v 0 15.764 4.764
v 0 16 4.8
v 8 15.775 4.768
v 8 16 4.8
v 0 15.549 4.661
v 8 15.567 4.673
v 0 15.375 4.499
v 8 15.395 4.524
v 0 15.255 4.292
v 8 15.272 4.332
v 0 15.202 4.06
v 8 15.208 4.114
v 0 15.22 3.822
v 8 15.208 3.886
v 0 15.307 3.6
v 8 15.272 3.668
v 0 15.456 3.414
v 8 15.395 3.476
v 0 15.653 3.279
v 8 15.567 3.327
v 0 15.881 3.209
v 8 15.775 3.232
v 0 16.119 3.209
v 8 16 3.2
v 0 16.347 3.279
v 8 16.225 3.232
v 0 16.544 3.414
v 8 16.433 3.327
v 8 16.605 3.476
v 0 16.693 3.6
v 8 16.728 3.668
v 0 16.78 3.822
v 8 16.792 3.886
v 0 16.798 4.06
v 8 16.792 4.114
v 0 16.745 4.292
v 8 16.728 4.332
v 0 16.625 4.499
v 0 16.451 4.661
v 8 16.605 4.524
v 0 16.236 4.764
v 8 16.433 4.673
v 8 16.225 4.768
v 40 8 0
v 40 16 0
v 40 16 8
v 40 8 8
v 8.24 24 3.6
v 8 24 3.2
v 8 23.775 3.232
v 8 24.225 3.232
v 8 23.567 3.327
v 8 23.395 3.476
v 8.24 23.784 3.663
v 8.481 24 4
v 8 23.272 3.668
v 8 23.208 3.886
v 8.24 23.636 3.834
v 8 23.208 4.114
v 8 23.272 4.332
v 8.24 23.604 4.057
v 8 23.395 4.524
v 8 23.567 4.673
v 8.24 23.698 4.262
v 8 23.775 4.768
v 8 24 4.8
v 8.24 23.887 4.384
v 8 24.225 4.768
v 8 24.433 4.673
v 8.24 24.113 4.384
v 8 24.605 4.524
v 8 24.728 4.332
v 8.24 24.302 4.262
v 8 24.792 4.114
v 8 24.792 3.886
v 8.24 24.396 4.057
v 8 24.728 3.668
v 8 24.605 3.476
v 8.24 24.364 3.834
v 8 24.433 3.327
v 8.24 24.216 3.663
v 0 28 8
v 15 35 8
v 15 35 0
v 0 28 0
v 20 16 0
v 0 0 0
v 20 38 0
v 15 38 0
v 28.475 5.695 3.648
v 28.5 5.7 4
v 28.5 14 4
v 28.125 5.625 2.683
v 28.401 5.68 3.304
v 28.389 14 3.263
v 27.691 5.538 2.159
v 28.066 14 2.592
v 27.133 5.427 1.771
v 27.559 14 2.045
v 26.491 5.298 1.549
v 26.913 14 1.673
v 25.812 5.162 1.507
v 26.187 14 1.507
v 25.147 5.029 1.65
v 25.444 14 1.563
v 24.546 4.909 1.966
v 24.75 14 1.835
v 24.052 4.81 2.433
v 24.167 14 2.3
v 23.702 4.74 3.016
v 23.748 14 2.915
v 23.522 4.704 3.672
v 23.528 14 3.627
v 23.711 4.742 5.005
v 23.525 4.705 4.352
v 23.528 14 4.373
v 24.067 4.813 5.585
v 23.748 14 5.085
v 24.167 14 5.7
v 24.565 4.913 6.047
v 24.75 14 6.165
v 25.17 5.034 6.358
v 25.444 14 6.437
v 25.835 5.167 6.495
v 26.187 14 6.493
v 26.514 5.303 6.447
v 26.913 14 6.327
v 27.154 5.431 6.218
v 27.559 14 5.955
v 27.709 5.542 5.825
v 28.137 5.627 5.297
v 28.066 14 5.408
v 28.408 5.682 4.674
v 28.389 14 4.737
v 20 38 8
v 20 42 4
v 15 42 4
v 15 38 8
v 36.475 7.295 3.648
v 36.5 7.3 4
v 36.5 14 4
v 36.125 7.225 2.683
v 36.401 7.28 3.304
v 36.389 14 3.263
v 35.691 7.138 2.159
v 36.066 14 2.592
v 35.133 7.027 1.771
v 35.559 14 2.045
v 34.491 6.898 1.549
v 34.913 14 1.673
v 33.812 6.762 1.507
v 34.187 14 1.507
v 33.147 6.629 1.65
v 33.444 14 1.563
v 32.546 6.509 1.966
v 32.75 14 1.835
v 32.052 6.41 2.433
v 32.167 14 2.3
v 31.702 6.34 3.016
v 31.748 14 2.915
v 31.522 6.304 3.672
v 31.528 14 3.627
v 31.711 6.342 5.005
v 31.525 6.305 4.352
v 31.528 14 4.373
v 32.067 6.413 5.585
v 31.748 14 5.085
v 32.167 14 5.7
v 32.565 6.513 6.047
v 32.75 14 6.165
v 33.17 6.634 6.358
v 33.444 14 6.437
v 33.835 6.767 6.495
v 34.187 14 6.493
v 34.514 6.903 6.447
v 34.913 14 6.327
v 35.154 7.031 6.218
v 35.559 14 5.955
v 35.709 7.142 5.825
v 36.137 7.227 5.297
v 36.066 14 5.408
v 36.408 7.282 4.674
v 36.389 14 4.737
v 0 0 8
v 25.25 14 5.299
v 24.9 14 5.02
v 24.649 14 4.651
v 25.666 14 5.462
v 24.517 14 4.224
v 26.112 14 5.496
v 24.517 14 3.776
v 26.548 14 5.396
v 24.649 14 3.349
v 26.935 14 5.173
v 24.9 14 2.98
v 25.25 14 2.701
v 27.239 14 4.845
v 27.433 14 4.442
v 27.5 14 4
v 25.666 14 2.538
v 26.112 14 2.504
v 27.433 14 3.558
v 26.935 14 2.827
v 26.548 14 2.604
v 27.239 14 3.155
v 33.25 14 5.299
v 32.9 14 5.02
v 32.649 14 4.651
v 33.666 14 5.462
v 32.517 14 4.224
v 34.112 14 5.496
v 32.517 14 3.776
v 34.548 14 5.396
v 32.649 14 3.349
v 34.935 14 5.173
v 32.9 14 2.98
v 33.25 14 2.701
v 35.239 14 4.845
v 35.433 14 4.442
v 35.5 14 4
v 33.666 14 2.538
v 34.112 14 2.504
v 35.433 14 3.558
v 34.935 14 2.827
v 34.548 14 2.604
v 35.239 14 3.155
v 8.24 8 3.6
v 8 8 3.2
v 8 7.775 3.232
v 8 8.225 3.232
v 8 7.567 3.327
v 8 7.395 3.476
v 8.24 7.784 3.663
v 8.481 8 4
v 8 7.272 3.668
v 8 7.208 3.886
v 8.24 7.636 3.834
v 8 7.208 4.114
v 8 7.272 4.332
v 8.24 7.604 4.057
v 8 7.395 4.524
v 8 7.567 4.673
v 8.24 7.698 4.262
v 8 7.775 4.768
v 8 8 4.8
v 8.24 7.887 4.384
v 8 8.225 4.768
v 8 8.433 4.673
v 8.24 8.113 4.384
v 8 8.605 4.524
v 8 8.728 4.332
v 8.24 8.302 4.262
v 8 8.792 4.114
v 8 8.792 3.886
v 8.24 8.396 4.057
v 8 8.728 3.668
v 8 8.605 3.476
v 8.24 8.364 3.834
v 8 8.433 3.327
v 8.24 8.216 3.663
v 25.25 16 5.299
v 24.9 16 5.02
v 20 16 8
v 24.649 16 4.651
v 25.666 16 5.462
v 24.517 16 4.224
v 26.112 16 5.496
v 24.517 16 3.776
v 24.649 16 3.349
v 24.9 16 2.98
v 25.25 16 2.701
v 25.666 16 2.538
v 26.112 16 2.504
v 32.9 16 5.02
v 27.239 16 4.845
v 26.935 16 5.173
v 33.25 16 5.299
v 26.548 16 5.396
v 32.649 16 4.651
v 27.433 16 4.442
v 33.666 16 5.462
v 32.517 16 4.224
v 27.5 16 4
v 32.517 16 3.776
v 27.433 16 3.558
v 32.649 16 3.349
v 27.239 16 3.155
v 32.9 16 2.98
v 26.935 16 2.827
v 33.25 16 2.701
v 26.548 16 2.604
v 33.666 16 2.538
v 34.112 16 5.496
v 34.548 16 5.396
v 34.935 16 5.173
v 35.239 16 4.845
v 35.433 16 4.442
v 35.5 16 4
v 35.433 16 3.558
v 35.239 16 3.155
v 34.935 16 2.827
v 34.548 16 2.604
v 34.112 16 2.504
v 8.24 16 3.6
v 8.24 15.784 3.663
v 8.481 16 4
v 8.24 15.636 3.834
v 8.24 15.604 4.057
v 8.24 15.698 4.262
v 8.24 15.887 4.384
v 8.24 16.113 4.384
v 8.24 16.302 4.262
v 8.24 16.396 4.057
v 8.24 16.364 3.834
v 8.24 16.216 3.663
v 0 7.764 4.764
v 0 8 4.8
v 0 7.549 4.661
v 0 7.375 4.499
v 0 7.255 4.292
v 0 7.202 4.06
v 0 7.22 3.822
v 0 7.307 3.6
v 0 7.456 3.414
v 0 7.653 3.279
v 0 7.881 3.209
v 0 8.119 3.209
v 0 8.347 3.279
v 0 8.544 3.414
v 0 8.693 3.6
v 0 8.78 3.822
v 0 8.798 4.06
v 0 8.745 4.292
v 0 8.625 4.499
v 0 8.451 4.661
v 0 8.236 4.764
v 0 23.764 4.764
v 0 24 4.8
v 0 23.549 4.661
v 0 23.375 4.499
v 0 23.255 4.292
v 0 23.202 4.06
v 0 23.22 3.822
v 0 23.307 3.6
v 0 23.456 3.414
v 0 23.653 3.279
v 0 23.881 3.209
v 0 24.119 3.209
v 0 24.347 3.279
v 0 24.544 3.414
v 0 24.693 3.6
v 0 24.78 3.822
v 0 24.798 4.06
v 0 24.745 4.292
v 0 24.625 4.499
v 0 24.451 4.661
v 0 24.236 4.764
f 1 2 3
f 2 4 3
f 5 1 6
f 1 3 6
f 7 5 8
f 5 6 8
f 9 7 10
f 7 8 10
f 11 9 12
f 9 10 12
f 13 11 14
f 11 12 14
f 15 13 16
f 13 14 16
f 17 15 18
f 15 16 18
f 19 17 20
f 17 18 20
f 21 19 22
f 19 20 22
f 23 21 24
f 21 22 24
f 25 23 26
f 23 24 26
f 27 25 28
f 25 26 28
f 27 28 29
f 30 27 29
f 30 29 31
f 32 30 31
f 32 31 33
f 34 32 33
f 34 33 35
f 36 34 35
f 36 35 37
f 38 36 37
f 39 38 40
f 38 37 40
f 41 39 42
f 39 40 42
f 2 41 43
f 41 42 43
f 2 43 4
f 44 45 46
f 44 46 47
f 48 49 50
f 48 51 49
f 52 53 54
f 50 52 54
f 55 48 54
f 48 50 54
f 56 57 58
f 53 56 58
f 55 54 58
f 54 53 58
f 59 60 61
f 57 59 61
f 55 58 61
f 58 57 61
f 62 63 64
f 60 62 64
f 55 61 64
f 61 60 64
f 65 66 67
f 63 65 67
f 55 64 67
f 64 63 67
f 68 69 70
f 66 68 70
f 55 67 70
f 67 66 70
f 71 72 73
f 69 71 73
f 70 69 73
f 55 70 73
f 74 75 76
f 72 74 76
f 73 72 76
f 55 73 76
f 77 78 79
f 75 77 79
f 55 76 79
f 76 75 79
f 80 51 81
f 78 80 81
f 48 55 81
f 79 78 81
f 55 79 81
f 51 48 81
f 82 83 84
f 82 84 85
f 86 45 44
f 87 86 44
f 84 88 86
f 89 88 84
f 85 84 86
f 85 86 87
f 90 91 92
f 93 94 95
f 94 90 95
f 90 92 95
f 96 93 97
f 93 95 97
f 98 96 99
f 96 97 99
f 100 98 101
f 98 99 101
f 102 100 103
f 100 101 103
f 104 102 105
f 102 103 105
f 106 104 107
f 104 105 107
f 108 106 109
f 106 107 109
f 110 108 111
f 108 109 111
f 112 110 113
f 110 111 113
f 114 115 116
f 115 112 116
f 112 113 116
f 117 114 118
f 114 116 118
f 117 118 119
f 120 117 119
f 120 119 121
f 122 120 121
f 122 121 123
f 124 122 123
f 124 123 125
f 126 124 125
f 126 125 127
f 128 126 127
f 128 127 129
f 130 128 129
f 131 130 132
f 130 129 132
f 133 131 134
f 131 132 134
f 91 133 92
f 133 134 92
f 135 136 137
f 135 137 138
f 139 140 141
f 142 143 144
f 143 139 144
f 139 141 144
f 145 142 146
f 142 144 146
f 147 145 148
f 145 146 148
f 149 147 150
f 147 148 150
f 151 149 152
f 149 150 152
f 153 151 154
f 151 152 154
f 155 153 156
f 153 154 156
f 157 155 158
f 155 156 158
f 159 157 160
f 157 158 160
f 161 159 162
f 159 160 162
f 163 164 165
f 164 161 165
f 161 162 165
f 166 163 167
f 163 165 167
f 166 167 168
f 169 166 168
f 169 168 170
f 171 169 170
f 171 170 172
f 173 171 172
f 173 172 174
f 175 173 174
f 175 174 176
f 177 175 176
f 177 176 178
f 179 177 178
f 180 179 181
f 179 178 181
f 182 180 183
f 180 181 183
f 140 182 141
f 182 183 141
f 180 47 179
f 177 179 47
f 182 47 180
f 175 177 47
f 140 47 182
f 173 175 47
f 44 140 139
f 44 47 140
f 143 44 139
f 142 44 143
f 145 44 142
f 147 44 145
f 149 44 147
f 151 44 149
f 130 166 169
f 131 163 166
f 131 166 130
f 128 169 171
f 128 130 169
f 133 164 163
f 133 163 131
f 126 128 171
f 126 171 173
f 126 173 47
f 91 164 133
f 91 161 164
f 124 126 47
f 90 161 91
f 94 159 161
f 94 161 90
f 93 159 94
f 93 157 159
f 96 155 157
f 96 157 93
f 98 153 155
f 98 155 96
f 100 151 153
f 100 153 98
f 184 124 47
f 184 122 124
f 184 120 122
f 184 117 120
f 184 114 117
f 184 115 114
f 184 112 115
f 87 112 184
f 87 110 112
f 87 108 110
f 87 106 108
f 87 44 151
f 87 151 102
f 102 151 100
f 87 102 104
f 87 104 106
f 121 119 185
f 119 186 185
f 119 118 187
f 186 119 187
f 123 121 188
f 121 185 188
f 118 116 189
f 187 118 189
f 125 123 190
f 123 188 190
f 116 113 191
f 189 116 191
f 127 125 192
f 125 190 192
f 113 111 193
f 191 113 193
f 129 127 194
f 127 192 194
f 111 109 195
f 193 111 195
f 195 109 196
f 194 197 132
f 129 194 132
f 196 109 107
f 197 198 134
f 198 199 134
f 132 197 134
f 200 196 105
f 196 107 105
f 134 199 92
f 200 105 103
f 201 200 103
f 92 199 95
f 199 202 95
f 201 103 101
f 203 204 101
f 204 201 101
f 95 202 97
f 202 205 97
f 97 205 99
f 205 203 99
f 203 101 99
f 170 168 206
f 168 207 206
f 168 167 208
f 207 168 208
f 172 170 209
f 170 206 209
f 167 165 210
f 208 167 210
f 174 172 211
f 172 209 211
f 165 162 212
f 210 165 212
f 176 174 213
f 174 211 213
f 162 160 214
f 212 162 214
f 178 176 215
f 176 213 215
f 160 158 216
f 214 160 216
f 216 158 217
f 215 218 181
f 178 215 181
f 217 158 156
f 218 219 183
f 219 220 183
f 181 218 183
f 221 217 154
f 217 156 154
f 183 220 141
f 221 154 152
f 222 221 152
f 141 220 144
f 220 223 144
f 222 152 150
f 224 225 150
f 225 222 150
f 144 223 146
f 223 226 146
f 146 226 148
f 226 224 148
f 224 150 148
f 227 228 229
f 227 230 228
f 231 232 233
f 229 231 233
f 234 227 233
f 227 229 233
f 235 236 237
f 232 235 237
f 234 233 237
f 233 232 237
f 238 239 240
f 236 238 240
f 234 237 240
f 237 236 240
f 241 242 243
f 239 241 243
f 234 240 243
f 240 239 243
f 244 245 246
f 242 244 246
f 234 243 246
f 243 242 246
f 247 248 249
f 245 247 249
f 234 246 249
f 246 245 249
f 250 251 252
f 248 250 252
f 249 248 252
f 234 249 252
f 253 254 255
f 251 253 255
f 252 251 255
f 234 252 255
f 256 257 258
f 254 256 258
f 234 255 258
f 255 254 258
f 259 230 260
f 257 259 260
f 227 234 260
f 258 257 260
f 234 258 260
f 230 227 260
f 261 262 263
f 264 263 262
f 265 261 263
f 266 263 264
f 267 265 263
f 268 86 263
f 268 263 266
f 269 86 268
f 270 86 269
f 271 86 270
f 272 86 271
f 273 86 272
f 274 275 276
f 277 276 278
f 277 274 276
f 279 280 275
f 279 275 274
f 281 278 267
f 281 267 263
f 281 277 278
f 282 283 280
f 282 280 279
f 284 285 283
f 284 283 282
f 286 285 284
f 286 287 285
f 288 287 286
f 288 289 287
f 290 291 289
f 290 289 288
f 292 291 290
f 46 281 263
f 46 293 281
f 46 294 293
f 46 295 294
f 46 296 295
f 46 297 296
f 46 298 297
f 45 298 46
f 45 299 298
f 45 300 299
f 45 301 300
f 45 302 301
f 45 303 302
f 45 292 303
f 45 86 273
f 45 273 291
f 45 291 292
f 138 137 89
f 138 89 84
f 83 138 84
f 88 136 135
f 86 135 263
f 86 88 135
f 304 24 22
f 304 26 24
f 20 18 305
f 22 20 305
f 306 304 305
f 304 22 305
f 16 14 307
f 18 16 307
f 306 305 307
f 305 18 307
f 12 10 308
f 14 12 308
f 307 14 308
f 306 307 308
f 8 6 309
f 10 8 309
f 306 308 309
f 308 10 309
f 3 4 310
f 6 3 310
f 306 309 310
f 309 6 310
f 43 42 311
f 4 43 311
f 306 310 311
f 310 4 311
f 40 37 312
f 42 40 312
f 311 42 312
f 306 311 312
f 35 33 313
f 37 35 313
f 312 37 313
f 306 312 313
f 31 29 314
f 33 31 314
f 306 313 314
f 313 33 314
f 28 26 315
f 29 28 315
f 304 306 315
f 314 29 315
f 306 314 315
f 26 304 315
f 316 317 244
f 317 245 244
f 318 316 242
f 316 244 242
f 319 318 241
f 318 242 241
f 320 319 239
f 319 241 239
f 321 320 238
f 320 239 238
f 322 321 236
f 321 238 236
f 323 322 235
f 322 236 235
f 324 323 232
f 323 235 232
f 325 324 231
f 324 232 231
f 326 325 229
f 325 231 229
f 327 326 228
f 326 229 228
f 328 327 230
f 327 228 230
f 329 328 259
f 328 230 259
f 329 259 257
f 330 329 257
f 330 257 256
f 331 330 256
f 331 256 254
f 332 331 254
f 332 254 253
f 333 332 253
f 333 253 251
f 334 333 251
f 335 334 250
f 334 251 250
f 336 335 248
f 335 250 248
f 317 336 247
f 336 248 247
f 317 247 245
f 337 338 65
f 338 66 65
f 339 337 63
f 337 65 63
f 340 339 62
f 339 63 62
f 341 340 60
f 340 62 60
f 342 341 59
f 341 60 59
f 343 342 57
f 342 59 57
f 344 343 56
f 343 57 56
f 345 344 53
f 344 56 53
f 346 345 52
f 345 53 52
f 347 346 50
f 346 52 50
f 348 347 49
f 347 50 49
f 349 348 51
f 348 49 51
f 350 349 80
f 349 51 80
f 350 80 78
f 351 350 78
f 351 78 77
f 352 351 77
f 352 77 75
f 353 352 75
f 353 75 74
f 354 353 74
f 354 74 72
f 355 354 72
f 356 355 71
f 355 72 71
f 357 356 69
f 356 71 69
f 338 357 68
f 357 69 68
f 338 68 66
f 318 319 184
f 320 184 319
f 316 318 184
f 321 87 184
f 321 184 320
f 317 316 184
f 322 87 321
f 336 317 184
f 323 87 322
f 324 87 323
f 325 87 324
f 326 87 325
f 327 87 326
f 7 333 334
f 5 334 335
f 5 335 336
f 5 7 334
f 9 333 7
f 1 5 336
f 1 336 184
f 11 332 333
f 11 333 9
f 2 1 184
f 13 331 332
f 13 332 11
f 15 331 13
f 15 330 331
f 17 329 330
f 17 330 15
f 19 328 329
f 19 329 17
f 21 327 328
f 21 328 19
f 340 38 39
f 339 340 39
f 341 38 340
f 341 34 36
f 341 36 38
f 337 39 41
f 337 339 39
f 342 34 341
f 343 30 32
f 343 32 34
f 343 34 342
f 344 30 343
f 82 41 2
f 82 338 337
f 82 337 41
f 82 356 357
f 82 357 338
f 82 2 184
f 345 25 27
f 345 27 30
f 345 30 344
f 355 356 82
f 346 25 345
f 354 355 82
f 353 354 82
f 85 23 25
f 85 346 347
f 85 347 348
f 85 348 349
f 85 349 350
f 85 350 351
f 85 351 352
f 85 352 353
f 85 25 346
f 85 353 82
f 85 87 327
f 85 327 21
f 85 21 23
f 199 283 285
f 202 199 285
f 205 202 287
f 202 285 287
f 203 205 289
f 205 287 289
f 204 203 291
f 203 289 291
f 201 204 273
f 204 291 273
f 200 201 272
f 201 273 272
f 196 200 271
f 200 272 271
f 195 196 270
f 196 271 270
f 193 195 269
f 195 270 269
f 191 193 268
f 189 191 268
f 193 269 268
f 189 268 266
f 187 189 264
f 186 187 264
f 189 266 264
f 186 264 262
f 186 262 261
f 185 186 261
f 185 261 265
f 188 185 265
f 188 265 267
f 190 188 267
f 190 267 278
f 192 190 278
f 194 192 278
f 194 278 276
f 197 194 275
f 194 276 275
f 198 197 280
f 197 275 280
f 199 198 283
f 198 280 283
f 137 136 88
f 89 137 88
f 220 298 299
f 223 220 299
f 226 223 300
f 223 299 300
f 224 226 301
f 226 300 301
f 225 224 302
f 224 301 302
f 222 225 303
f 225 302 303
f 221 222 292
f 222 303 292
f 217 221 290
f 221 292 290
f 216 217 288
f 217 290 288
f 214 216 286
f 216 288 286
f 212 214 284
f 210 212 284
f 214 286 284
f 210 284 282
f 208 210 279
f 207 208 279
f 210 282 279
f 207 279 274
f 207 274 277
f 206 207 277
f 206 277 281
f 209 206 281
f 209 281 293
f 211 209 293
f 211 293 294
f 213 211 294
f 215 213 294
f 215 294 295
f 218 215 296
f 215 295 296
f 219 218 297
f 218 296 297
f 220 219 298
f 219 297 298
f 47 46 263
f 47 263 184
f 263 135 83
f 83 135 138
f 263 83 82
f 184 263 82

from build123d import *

# Parameters (mm, degrees)
BOSS_EXTRUDE1_DEPTH       = 8
CUT_EXTRUDE1_DEPTH        = 8
SKETCH7_R                 = 1.5
CUT_EXTRUDE4_DEPTH        = 2
SKETCH9_R                 = 2.5
CUT_EXTRUDE5_DEPTH        = 15
CUT_EXTRUDE2_DEPTH        = 21
CUT_EXTRUDE3_DEPTH        = 21
M2X0_4_TAPPED_HOLE1_D     = 1.6
M2X0_4_TAPPED_HOLE1_DEPTH = 8
M2X0_4_TAPPED_HOLE1_TIP   = 0.480688495


with BuildPart() as part:
    # Sketch1 → Boss-Extrude1 (new body)
    with BuildSketch(Plane.XY):
        Polygon((0, 0), (0, 42), (20, 42), (20, 16), (40, 16), (40, 8), align=None)
    extrude(amount=BOSS_EXTRUDE1_DEPTH)

    # Sketch2 → Cut-Extrude1 (cut)
    with BuildSketch(Plane.XY.offset(8)):
        Polygon((15, 42), (15, 35), (0, 28), (0, 42), align=None)
    extrude(amount=-CUT_EXTRUDE1_DEPTH, mode=Mode.SUBTRACT)

    # Sketch7 → Cut-Extrude4 (cut)
    with BuildSketch(Plane(origin=(0, 16, 0), x_dir=(1, 0, 0), z_dir=(0, 1, 0))):
        with Locations((34, -4)):
            Circle(SKETCH7_R)
        with Locations((26, -4)):
            Circle(SKETCH7_R)
    extrude(amount=-CUT_EXTRUDE4_DEPTH, mode=Mode.SUBTRACT)

    # Sketch9 → Cut-Extrude5 (cut, through all)
    with BuildSketch(Plane(origin=(0, 14, 0), x_dir=(1, 0, 0), z_dir=(0, 1, 0))):
        with Locations((34, -4)):
            Circle(SKETCH9_R)
        with Locations((26, -4)):
            Circle(SKETCH9_R)
    extrude(amount=-CUT_EXTRUDE5_DEPTH, mode=Mode.SUBTRACT)

    # Sketch5 → Cut-Extrude2 (cut, through all)
    with BuildSketch(Plane(origin=(20, 0, 0), x_dir=(0, 0, -1), z_dir=(1, 0, 0))):
        Polygon((-8, 42), (-4, 42), (-8, 38), align=None)
    extrude(amount=-CUT_EXTRUDE2_DEPTH, mode=Mode.SUBTRACT)

    # Sketch6 → Cut-Extrude3 (cut, through all)
    with BuildSketch(Plane(origin=(20, 0, 0), x_dir=(0, 0, -1), z_dir=(1, 0, 0))):
        Polygon((0, 42), (-4, 42), (0, 38), align=None)
    extrude(amount=-CUT_EXTRUDE3_DEPTH, mode=Mode.SUBTRACT)

    # M2x0.4 Tapped Hole1
    with Locations(Plane(origin=(0, 24, 4), x_dir=(0, 0, -1), z_dir=(-1, 0, 0))):
        with Locations((0, 0), (0, 8), (0, 16)):
            Hole(M2X0_4_TAPPED_HOLE1_D / 2, depth=M2X0_4_TAPPED_HOLE1_DEPTH)
            with Locations((0, 0, -(M2X0_4_TAPPED_HOLE1_DEPTH + M2X0_4_TAPPED_HOLE1_TIP / 2))):  # 118° drill point
                Cone(0, M2X0_4_TAPPED_HOLE1_D / 2, M2X0_4_TAPPED_HOLE1_TIP, mode=Mode.SUBTRACT)


solid = part.part
